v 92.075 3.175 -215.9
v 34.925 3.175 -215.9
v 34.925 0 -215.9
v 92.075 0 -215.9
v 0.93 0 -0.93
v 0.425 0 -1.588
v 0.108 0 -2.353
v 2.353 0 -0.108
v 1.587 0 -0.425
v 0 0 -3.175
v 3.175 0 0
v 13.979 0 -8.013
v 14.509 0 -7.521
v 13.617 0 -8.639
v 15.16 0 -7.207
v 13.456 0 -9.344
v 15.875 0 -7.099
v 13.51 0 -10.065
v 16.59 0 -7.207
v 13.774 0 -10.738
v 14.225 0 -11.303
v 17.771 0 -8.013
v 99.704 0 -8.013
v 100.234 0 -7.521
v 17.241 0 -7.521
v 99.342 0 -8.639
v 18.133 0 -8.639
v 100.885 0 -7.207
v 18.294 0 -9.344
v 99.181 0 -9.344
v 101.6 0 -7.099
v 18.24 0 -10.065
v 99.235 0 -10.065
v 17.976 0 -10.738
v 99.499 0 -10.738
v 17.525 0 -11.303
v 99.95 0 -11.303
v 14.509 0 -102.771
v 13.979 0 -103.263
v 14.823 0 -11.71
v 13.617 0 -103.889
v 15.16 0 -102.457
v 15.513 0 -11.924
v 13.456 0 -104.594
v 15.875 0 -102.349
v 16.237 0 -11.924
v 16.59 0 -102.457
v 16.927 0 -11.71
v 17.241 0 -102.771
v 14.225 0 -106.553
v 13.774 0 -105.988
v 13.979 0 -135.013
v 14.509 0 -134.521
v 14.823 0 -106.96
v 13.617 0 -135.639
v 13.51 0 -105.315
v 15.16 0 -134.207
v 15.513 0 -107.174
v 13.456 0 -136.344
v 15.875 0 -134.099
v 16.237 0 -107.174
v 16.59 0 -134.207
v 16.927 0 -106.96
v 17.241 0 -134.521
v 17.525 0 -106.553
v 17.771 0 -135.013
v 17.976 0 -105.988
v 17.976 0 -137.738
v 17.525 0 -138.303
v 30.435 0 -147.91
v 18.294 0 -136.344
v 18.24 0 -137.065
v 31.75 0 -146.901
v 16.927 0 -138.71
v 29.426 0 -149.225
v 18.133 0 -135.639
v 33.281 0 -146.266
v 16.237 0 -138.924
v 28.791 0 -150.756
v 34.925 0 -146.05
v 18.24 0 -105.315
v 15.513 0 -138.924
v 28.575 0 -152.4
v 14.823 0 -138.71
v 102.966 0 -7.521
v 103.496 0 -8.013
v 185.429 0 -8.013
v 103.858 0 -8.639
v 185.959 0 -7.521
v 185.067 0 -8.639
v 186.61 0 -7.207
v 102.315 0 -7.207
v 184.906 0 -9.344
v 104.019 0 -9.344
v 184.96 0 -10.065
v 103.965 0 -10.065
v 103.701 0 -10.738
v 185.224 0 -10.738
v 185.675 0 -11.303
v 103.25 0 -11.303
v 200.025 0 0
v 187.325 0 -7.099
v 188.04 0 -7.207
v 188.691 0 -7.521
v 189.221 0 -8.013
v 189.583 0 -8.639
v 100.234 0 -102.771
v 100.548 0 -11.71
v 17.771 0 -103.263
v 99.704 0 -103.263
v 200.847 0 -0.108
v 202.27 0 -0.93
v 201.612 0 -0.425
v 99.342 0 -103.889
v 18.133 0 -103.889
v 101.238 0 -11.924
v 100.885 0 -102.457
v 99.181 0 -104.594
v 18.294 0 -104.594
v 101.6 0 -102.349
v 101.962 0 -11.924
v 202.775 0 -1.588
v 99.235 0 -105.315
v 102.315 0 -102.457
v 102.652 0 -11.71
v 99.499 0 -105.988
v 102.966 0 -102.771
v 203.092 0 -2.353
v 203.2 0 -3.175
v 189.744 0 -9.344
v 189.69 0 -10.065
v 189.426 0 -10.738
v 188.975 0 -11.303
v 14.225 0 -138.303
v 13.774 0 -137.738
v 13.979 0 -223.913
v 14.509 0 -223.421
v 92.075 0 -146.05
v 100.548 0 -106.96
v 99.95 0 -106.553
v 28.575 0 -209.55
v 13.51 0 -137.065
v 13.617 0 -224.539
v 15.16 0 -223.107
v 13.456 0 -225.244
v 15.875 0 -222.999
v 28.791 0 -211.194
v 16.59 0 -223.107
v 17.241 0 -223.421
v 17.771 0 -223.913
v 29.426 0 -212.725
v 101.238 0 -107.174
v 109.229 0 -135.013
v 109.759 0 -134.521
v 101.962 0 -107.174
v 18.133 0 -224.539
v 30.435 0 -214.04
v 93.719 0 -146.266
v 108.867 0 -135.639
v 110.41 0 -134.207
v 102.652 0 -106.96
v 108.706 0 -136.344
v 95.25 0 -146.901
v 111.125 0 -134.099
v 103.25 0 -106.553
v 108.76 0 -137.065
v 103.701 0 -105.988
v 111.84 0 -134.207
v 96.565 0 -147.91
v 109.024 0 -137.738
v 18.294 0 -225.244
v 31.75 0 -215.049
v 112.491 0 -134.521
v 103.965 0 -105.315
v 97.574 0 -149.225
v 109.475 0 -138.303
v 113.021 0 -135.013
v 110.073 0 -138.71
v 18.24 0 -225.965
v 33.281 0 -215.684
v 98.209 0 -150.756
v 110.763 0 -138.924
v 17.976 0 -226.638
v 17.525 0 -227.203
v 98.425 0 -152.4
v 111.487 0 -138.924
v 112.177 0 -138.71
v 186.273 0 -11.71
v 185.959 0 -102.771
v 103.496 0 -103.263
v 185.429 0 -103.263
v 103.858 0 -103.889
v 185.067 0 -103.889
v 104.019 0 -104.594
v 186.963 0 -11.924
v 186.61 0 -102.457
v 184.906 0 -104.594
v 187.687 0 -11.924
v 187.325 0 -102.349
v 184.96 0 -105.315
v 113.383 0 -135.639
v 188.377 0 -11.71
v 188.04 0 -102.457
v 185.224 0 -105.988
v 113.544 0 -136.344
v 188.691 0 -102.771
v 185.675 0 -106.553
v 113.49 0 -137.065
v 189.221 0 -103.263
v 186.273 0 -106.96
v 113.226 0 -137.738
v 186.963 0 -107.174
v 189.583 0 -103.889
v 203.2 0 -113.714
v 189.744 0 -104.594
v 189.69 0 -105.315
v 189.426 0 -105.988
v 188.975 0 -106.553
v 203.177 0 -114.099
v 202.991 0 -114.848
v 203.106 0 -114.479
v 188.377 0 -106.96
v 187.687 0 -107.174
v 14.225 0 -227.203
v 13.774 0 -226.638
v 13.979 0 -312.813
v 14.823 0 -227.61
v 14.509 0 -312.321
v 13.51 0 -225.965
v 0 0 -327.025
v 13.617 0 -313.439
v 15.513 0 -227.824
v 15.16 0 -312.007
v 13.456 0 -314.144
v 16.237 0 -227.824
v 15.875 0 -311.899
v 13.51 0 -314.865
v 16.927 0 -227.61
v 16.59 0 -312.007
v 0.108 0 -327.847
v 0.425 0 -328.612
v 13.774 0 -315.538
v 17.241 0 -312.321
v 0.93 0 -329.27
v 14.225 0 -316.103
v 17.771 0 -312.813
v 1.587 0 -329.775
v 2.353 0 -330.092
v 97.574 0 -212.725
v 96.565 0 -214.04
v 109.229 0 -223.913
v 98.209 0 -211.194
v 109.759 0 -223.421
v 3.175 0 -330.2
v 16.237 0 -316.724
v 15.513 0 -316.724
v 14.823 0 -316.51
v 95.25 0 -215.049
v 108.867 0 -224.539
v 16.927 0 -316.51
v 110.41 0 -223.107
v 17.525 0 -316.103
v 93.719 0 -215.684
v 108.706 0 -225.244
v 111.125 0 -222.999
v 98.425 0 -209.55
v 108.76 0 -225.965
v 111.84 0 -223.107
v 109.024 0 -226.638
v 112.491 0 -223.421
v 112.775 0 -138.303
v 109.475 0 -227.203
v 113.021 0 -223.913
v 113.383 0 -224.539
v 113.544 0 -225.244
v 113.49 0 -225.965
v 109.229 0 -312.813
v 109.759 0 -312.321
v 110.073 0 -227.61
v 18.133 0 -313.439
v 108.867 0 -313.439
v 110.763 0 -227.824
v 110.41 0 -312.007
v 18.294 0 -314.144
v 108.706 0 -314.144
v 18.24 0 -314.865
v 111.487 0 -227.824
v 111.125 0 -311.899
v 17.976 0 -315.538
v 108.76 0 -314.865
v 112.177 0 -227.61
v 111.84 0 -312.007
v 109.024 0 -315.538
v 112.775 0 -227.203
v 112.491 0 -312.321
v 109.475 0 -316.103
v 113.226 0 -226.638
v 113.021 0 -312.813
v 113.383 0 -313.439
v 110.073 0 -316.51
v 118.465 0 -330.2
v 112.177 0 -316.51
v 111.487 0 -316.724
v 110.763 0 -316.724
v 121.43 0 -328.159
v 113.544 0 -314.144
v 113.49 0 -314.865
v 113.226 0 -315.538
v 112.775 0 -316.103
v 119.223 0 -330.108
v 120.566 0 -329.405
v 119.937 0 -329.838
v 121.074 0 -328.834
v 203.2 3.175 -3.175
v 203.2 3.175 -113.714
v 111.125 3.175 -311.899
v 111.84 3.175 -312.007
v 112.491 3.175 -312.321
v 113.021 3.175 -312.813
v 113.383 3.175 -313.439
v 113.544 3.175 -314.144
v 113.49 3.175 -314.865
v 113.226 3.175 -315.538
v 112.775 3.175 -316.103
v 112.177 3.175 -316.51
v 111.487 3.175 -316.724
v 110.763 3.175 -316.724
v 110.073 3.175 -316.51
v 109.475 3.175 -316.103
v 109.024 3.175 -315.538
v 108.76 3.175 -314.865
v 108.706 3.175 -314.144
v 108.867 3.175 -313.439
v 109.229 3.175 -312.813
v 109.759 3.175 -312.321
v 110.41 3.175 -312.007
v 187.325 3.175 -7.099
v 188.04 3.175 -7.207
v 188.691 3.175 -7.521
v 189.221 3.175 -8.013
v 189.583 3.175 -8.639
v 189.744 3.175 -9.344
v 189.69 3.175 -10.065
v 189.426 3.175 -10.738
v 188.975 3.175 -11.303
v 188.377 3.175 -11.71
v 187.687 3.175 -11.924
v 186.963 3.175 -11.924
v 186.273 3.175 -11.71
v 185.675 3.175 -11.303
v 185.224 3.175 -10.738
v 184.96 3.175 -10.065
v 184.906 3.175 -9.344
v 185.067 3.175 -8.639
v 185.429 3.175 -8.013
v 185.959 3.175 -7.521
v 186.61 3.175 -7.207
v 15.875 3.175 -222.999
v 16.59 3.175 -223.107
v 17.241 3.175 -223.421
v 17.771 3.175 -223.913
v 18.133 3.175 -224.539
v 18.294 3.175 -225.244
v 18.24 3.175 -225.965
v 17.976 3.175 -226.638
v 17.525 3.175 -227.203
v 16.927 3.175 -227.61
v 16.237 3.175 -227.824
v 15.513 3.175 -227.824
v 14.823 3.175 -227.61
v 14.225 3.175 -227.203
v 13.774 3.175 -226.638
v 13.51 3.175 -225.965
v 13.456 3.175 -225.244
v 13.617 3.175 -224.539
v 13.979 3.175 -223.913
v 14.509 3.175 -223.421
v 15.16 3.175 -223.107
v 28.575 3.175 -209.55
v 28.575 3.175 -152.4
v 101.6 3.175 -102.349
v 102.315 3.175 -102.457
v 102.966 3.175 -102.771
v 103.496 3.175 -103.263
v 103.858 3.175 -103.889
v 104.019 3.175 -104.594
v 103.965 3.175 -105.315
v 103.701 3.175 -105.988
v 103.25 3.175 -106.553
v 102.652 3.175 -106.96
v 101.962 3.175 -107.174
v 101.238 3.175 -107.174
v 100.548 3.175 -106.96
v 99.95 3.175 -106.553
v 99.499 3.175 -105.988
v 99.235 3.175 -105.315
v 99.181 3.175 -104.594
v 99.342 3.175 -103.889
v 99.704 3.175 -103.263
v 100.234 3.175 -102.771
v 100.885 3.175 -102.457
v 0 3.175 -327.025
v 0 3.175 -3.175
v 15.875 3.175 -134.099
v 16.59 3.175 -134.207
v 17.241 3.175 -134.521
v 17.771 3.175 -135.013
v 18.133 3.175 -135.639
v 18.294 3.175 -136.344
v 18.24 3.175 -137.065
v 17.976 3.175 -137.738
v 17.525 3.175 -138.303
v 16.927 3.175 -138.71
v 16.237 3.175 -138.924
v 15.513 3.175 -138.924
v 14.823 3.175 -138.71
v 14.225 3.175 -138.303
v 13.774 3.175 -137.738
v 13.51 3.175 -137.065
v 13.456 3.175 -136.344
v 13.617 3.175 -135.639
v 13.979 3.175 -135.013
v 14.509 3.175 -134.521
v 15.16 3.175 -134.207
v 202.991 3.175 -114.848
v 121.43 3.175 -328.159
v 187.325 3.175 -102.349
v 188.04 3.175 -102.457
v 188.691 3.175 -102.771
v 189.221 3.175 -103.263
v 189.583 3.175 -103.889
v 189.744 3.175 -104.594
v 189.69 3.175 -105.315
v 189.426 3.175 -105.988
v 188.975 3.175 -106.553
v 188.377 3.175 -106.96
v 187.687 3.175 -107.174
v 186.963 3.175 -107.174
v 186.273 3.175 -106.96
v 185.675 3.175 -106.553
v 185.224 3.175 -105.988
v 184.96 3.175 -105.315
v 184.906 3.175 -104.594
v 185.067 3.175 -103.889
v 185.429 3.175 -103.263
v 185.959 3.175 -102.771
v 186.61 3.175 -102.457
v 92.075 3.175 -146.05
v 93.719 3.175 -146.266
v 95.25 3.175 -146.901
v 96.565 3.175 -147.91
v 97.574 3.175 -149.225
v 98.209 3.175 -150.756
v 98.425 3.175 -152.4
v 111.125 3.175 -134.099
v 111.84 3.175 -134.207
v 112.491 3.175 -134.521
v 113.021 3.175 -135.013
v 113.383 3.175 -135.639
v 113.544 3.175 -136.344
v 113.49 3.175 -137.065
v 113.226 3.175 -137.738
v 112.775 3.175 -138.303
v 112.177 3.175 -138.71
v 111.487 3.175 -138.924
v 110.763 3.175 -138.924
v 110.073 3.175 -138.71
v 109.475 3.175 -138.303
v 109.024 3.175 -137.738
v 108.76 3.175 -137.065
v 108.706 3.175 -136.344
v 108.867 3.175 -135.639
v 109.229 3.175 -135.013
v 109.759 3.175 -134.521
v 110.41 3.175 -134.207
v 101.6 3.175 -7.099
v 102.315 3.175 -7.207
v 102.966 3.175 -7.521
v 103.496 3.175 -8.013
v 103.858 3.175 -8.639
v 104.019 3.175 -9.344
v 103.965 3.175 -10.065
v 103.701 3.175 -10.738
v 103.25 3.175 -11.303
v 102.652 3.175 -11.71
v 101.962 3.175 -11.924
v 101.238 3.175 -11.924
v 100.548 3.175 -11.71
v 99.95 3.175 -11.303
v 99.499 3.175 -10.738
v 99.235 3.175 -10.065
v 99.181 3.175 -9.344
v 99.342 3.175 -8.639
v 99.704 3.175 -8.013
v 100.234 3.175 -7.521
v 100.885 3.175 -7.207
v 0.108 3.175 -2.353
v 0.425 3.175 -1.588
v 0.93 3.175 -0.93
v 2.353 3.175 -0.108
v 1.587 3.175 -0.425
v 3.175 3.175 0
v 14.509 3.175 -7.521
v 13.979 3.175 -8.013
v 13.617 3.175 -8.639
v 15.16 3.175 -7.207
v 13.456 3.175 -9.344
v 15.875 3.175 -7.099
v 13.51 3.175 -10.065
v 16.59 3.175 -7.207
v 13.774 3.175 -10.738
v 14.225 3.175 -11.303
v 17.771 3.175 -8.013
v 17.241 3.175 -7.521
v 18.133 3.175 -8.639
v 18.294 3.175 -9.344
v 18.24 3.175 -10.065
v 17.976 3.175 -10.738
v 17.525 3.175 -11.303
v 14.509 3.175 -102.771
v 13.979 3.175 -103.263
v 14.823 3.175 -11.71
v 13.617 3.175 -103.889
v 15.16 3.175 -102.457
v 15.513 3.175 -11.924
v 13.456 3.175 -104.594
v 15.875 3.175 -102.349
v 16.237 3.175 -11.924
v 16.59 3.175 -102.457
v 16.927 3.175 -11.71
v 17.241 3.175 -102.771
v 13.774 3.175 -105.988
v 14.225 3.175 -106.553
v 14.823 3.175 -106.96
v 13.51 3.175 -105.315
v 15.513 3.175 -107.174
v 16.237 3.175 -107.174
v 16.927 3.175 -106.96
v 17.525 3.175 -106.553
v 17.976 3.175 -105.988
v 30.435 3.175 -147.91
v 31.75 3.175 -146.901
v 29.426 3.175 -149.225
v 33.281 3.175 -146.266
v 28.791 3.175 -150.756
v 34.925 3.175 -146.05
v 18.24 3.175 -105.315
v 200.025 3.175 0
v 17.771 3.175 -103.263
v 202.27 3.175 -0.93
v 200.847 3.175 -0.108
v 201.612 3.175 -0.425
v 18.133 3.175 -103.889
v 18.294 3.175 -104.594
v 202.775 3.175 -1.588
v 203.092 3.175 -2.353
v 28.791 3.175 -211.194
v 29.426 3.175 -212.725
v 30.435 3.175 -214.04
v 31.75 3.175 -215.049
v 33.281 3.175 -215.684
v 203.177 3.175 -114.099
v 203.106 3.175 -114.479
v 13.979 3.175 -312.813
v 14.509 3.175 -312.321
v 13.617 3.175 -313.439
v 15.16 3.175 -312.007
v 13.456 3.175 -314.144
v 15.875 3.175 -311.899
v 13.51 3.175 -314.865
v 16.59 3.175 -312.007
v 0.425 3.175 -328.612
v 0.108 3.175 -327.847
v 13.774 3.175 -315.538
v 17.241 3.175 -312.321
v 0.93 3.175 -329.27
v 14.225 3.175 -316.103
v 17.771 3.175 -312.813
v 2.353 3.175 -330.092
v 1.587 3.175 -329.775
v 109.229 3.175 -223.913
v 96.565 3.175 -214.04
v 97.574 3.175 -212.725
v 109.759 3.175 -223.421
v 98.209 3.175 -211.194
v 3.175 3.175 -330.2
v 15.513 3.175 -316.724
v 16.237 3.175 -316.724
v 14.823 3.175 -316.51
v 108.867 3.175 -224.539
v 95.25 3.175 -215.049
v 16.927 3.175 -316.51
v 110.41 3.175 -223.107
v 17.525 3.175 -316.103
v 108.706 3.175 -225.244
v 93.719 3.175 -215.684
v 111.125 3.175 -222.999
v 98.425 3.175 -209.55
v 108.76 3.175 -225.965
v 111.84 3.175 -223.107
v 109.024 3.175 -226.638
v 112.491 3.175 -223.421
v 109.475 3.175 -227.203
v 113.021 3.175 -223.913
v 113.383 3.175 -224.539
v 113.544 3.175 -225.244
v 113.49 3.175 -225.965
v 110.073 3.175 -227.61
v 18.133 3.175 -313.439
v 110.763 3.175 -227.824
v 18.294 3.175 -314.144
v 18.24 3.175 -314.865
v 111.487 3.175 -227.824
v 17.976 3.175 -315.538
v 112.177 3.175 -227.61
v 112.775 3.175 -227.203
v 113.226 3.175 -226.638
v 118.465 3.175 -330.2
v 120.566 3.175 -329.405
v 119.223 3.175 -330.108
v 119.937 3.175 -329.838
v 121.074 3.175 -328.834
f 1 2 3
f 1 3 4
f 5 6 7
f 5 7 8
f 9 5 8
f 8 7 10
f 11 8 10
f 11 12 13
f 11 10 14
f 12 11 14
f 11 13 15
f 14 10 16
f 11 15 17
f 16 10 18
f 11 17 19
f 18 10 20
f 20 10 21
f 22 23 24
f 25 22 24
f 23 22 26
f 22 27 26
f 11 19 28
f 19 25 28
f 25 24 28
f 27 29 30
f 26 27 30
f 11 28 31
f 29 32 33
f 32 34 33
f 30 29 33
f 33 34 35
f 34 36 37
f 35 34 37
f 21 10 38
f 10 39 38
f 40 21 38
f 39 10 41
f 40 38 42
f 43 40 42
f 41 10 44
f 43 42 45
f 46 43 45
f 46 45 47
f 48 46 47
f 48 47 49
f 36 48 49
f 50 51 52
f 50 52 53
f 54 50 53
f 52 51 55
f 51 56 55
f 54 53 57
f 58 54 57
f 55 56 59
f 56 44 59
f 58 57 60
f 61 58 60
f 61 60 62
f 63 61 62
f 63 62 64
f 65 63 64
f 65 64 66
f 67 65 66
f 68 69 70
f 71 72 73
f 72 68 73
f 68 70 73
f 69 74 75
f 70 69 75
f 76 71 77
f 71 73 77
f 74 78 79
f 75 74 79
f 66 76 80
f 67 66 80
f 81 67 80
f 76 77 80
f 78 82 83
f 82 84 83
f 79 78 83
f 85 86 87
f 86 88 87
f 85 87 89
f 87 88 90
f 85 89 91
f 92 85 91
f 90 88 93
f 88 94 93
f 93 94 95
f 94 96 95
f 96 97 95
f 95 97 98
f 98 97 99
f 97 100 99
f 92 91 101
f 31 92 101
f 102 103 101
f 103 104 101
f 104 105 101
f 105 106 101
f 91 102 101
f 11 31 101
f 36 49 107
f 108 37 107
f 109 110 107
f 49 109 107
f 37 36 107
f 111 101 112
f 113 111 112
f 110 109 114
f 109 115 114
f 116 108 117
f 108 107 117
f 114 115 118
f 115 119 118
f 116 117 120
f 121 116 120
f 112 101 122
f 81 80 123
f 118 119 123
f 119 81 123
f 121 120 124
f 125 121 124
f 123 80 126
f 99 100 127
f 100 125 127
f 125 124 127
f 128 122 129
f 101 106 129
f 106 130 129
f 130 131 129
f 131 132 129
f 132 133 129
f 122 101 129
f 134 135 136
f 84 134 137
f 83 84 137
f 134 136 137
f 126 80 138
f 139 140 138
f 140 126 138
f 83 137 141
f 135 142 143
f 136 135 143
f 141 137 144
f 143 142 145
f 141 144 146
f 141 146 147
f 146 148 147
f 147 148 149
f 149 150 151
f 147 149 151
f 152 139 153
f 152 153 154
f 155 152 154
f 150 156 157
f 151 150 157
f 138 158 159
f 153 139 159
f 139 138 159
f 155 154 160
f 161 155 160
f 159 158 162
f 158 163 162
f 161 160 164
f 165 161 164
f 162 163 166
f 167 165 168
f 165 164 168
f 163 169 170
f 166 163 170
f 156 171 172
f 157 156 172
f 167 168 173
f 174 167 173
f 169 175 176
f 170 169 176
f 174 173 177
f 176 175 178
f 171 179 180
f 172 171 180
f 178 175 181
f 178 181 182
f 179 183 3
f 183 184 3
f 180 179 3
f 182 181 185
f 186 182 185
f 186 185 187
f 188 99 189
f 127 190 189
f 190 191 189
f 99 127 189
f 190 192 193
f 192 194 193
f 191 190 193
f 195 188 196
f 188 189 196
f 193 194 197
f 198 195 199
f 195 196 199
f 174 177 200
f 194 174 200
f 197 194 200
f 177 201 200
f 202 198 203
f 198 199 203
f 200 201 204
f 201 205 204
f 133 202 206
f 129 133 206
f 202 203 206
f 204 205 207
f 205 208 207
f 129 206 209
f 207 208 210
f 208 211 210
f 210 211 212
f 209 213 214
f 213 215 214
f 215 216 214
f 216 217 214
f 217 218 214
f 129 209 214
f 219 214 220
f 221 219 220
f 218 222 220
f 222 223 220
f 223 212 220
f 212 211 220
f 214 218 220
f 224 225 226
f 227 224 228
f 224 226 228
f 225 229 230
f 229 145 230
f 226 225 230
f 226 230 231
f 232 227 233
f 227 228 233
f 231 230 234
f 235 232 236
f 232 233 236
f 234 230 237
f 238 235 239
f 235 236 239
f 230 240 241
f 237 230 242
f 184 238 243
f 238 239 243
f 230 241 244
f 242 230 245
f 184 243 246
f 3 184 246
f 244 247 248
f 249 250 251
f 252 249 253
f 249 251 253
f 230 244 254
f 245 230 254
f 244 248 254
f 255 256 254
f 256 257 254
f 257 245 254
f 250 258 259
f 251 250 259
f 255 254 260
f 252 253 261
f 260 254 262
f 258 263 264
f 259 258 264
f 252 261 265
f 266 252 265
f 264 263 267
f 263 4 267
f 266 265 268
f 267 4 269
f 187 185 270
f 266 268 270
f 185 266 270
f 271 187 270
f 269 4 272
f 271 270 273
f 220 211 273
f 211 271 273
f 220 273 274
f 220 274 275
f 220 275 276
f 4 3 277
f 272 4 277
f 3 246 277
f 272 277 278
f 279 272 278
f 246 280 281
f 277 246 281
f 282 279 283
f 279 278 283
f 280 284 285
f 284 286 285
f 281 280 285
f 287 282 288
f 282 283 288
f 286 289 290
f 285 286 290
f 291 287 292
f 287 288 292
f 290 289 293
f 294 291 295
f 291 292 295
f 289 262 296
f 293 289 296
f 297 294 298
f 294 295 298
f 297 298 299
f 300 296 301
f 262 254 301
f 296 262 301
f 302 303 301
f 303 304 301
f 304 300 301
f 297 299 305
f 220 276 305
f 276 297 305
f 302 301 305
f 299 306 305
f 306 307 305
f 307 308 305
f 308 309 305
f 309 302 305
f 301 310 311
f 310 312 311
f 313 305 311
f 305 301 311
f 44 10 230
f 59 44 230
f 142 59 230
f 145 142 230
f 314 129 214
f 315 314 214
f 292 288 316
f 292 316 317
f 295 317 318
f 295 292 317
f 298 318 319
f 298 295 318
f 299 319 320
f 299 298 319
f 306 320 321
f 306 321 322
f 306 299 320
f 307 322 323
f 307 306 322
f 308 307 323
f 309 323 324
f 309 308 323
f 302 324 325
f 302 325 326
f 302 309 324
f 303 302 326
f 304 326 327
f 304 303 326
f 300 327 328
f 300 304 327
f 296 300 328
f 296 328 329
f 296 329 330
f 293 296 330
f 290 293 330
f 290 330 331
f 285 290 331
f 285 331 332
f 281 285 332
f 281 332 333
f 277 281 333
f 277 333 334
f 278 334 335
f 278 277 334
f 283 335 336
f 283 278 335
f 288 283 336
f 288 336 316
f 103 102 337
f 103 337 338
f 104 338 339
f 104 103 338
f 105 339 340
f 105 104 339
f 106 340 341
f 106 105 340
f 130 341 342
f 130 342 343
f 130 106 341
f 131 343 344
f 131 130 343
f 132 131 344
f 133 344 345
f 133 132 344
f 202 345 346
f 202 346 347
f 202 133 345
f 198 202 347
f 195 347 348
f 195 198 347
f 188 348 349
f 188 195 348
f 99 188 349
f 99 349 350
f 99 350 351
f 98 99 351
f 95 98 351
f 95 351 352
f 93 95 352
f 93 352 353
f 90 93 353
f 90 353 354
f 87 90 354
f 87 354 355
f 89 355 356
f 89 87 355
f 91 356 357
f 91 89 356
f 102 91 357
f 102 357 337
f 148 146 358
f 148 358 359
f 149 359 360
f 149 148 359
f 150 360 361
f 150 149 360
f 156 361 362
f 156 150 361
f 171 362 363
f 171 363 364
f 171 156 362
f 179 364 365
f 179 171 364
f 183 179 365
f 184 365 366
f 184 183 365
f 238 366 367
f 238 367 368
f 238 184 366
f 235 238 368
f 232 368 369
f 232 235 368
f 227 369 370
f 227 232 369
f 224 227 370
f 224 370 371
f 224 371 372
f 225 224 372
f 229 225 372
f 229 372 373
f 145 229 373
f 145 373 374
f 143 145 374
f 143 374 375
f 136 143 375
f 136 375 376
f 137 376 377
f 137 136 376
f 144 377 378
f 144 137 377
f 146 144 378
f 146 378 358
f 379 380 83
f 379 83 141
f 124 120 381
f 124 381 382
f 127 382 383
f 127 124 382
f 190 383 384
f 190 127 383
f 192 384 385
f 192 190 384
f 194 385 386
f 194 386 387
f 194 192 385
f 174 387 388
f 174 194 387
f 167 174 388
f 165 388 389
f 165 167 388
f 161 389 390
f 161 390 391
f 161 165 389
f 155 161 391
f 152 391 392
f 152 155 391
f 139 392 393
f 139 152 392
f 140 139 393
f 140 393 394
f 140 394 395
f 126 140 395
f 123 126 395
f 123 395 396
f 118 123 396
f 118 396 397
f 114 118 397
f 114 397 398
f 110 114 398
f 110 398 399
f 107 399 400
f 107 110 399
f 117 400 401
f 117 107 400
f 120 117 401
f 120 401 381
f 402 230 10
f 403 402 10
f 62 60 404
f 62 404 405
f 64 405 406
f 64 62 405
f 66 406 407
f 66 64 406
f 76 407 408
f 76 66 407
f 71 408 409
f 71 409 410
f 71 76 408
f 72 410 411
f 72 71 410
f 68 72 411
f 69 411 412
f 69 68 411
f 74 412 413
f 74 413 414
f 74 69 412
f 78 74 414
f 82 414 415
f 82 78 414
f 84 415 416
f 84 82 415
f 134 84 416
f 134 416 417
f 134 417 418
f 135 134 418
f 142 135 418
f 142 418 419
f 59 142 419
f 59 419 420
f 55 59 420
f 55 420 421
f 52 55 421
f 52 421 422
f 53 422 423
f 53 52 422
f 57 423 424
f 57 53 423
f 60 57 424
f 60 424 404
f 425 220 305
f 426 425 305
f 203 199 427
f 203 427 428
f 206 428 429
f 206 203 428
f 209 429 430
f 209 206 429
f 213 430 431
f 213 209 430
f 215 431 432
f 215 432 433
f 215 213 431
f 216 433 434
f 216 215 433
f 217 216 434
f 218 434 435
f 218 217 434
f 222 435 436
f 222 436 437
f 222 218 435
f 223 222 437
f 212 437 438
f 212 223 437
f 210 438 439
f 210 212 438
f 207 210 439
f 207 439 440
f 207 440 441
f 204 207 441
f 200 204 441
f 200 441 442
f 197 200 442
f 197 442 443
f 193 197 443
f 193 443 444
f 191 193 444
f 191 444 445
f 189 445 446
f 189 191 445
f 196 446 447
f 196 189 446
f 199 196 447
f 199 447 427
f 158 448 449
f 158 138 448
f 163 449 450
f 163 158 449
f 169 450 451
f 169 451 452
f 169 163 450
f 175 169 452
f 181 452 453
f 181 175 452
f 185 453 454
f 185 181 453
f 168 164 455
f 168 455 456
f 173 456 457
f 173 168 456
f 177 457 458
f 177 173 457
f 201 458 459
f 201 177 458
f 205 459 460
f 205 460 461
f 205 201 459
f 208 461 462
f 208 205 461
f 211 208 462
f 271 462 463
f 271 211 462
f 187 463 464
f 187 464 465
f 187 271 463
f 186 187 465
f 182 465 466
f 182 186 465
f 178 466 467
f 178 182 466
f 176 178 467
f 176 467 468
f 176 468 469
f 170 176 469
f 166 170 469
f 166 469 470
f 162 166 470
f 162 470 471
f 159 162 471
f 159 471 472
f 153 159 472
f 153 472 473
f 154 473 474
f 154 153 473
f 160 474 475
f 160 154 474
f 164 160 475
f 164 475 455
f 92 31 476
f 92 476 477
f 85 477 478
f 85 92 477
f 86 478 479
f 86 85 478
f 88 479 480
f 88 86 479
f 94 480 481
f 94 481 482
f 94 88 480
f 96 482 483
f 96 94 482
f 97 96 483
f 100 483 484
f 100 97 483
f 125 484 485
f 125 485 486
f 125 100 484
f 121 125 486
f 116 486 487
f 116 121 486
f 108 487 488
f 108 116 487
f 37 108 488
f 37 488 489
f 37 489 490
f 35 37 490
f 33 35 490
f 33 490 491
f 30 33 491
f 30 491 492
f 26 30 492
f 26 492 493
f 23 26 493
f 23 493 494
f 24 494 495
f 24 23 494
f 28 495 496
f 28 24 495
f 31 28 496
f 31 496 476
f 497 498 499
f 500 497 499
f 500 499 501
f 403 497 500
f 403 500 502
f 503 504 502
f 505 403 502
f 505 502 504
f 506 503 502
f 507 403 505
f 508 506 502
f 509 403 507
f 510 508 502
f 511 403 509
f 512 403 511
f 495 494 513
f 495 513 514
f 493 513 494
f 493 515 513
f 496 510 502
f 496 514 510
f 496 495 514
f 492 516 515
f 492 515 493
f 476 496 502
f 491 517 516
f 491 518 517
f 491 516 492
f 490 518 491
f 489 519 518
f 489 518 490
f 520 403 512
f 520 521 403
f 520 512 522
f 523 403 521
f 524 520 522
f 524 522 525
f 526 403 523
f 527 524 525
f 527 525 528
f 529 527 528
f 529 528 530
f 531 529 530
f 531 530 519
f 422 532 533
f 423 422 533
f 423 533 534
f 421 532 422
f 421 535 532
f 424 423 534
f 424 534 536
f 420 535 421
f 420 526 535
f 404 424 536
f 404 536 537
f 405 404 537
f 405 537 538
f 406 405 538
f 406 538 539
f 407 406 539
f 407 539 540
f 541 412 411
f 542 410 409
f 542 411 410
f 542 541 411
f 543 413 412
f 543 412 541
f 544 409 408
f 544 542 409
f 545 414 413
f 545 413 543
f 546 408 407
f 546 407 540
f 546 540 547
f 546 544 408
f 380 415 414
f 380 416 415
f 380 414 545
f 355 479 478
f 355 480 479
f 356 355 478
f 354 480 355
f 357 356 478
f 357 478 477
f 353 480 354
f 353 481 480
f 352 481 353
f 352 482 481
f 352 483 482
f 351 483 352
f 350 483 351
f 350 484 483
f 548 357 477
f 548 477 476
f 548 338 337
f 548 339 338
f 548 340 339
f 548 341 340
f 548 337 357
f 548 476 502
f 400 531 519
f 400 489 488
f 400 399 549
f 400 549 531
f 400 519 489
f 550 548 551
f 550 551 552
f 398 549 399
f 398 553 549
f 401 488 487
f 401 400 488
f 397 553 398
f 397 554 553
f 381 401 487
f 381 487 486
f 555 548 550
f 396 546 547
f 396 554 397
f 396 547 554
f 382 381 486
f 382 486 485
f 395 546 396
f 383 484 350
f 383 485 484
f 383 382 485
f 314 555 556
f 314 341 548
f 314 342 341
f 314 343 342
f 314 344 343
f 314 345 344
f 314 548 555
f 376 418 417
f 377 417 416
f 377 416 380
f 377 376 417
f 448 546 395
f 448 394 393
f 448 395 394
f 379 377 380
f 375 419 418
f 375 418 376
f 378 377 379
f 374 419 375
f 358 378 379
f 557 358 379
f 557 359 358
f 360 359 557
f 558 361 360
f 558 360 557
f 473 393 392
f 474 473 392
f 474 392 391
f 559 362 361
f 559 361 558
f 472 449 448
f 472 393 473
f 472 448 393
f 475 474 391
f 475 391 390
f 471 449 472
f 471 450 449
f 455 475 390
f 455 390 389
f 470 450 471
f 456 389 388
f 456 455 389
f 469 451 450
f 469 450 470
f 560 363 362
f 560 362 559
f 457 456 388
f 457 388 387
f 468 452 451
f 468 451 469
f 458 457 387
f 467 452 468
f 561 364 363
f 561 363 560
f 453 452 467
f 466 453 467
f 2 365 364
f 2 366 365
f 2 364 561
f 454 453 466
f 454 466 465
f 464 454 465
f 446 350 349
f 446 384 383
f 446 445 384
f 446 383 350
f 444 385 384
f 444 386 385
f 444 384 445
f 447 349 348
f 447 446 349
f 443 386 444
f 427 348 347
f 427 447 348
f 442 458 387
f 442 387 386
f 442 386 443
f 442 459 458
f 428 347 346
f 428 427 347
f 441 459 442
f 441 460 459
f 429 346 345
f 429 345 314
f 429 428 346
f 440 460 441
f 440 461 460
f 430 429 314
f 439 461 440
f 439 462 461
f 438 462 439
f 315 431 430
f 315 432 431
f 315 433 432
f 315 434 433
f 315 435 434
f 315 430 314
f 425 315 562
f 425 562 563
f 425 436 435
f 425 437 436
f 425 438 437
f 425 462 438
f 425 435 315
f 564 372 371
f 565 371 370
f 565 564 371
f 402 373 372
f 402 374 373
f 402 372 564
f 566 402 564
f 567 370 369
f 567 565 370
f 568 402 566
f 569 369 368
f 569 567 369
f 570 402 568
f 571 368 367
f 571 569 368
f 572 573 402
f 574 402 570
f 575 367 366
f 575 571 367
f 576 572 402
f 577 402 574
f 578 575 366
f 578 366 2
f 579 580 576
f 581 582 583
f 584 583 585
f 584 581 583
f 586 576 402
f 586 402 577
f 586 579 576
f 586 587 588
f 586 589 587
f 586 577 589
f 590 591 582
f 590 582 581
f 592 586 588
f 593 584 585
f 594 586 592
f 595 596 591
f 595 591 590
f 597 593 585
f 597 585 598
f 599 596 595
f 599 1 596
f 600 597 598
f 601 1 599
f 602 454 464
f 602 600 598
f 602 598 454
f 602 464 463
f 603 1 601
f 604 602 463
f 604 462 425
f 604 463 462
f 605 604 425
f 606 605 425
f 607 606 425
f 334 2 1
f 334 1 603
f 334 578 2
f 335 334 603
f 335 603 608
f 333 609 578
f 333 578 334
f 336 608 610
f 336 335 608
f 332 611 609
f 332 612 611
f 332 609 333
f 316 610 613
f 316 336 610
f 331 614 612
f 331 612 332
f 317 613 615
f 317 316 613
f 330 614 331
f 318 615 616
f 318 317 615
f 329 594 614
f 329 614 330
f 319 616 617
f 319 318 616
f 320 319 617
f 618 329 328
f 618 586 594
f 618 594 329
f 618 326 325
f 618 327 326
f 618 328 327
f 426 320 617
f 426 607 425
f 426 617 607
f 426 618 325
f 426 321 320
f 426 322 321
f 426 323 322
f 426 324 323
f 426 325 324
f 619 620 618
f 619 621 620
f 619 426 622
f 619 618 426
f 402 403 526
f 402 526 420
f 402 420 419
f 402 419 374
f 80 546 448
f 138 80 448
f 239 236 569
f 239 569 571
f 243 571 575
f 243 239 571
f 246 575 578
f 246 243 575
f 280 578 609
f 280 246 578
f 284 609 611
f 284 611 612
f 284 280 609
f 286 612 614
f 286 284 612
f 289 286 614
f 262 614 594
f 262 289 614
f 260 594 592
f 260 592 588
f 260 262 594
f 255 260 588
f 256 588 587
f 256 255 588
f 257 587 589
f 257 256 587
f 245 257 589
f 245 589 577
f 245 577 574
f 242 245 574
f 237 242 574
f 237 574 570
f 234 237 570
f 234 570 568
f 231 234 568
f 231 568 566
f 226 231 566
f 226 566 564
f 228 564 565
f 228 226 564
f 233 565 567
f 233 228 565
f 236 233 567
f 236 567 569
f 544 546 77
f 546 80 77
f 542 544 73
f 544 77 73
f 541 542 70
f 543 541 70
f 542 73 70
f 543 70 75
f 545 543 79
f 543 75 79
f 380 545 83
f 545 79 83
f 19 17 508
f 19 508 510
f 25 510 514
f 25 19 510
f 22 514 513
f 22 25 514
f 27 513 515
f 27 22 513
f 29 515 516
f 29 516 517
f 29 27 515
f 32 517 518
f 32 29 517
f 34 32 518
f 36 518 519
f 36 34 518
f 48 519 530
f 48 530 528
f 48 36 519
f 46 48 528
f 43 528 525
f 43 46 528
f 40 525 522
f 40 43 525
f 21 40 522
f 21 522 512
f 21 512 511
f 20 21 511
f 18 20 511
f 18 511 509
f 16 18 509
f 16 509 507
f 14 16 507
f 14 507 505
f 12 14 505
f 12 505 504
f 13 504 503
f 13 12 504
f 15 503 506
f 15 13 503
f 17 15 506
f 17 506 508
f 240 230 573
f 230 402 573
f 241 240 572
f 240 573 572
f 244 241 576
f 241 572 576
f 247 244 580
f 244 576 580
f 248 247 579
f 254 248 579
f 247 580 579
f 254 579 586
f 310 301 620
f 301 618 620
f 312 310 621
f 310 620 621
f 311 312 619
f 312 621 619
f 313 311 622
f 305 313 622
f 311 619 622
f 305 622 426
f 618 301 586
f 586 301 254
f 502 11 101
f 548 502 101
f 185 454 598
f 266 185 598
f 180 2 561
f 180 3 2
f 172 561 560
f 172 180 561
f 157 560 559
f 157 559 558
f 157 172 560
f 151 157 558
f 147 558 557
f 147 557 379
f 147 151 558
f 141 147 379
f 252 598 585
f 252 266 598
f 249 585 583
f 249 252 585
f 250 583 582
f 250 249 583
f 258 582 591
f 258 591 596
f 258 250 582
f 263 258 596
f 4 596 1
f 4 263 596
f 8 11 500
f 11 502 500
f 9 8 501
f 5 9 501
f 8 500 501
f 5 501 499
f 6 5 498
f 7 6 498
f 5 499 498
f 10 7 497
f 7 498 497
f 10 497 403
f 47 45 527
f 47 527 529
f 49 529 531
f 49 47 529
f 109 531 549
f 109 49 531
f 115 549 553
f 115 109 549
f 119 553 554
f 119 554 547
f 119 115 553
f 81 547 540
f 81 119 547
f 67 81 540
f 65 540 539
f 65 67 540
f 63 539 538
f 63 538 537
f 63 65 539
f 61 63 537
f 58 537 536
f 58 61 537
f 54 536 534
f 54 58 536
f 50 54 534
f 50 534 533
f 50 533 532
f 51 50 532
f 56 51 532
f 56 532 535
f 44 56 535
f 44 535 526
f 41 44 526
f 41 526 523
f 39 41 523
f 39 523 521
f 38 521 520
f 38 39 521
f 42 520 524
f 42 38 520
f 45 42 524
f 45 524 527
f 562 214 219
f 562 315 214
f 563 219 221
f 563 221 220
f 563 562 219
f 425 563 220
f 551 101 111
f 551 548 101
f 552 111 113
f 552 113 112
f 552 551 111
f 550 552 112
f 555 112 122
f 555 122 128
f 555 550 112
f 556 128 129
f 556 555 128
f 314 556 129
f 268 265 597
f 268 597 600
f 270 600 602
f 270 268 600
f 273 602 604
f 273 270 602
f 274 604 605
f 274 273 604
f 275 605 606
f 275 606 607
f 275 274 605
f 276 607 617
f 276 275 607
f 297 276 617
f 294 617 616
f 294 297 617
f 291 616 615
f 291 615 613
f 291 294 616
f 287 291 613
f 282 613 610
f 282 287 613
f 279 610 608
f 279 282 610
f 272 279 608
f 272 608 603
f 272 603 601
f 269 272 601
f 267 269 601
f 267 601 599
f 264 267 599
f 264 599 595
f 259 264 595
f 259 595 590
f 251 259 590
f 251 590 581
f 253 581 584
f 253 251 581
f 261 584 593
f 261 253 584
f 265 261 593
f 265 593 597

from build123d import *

# Parameters (mm, degrees)
SKETCH1_R           = 2.4257
BOSS_EXTRUDE1_DEPTH = 3.175
FILLET1_R           = 3.175
SKETCH2_W           = 69.85
SKETCH2_H           = 69.85
CUT_EXTRUDE1_DEPTH  = 388.727172926
FILLET3_R           = 6.35


with BuildPart() as part:
    # Sketch1 → Boss-Extrude1 (new body)
    with BuildSketch(Plane(origin=(0, 0, 0), x_dir=(1, 0, 0), z_dir=(0, 1, 0))):
        Polygon((0, 0), (203.2, 0), (203.2, 114.3), (120.65, 330.2), (0, 330.2), align=None)
        with Locations(Location((15.875, 9.525, 0), (0, 0, 270))):
            Circle(SKETCH1_R, mode=Mode.SUBTRACT)
        with Locations(Location((101.6, 9.525, 0), (0, 0, 270))):
            Circle(SKETCH1_R, mode=Mode.SUBTRACT)
        with Locations(Location((187.325, 9.525, 0), (0, 0, 270))):
            Circle(SKETCH1_R, mode=Mode.SUBTRACT)
        with Locations(Location((15.875, 104.775, 0), (0, 0, 270))):
            Circle(SKETCH1_R, mode=Mode.SUBTRACT)
        with Locations(Location((187.325, 104.775, 0), (0, 0, 270))):
            Circle(SKETCH1_R, mode=Mode.SUBTRACT)
        with Locations(Location((101.6, 104.775, 0), (0, 0, 270))):
            Circle(SKETCH1_R, mode=Mode.SUBTRACT)
        with Locations(Location((15.875, 136.525, 0), (0, 0, 270))):
            Circle(SKETCH1_R, mode=Mode.SUBTRACT)
        with Locations(Location((111.125, 136.525, 0), (0, 0, 270))):
            Circle(SKETCH1_R, mode=Mode.SUBTRACT)
        with Locations(Location((15.875, 225.425, 0), (0, 0, 270))):
            Circle(SKETCH1_R, mode=Mode.SUBTRACT)
        with Locations(Location((15.875, 314.325, 0), (0, 0, 270))):
            Circle(SKETCH1_R, mode=Mode.SUBTRACT)
        with Locations(Location((111.125, 225.425, 0), (0, 0, 270))):
            Circle(SKETCH1_R, mode=Mode.SUBTRACT)
        with Locations(Location((111.125, 314.325, 0), (0, 0, 270))):
            Circle(SKETCH1_R, mode=Mode.SUBTRACT)
    extrude(amount=BOSS_EXTRUDE1_DEPTH)

    # Fillet1
    fillet1_edges = [part.edges().sort_by_distance(p)[0] for p in [
        (0, 1.5875, -330.2),
        (120.65, 1.5875, -330.2),
        (203.2, 1.5875, -114.3),
        (203.2, 1.5875, 0),
        (0, 1.5875, 0),
    ]]
    fillet(fillet1_edges, radius=FILLET1_R)

    # Sketch2 → Cut-Extrude1 (cut, through all)
    with BuildSketch(Plane(origin=(0, 3.175, 0), x_dir=(1, 0, 0), z_dir=(0, 1, 0))):
        with Locations((63.5, 180.975)):
            Rectangle(SKETCH2_W, SKETCH2_H)
    extrude(amount=-CUT_EXTRUDE1_DEPTH, mode=Mode.SUBTRACT)

    # Fillet3
    fillet3_edges = [part.edges().sort_by_distance(p)[0] for p in [
        (98.425, 1.5875, -215.9),
        (98.425, 1.5875, -146.05),
        (28.575, 1.5875, -146.05),
        (28.575, 1.5875, -215.9),
    ]]
    fillet(fillet3_edges, radius=FILLET3_R)


solid = part.part
